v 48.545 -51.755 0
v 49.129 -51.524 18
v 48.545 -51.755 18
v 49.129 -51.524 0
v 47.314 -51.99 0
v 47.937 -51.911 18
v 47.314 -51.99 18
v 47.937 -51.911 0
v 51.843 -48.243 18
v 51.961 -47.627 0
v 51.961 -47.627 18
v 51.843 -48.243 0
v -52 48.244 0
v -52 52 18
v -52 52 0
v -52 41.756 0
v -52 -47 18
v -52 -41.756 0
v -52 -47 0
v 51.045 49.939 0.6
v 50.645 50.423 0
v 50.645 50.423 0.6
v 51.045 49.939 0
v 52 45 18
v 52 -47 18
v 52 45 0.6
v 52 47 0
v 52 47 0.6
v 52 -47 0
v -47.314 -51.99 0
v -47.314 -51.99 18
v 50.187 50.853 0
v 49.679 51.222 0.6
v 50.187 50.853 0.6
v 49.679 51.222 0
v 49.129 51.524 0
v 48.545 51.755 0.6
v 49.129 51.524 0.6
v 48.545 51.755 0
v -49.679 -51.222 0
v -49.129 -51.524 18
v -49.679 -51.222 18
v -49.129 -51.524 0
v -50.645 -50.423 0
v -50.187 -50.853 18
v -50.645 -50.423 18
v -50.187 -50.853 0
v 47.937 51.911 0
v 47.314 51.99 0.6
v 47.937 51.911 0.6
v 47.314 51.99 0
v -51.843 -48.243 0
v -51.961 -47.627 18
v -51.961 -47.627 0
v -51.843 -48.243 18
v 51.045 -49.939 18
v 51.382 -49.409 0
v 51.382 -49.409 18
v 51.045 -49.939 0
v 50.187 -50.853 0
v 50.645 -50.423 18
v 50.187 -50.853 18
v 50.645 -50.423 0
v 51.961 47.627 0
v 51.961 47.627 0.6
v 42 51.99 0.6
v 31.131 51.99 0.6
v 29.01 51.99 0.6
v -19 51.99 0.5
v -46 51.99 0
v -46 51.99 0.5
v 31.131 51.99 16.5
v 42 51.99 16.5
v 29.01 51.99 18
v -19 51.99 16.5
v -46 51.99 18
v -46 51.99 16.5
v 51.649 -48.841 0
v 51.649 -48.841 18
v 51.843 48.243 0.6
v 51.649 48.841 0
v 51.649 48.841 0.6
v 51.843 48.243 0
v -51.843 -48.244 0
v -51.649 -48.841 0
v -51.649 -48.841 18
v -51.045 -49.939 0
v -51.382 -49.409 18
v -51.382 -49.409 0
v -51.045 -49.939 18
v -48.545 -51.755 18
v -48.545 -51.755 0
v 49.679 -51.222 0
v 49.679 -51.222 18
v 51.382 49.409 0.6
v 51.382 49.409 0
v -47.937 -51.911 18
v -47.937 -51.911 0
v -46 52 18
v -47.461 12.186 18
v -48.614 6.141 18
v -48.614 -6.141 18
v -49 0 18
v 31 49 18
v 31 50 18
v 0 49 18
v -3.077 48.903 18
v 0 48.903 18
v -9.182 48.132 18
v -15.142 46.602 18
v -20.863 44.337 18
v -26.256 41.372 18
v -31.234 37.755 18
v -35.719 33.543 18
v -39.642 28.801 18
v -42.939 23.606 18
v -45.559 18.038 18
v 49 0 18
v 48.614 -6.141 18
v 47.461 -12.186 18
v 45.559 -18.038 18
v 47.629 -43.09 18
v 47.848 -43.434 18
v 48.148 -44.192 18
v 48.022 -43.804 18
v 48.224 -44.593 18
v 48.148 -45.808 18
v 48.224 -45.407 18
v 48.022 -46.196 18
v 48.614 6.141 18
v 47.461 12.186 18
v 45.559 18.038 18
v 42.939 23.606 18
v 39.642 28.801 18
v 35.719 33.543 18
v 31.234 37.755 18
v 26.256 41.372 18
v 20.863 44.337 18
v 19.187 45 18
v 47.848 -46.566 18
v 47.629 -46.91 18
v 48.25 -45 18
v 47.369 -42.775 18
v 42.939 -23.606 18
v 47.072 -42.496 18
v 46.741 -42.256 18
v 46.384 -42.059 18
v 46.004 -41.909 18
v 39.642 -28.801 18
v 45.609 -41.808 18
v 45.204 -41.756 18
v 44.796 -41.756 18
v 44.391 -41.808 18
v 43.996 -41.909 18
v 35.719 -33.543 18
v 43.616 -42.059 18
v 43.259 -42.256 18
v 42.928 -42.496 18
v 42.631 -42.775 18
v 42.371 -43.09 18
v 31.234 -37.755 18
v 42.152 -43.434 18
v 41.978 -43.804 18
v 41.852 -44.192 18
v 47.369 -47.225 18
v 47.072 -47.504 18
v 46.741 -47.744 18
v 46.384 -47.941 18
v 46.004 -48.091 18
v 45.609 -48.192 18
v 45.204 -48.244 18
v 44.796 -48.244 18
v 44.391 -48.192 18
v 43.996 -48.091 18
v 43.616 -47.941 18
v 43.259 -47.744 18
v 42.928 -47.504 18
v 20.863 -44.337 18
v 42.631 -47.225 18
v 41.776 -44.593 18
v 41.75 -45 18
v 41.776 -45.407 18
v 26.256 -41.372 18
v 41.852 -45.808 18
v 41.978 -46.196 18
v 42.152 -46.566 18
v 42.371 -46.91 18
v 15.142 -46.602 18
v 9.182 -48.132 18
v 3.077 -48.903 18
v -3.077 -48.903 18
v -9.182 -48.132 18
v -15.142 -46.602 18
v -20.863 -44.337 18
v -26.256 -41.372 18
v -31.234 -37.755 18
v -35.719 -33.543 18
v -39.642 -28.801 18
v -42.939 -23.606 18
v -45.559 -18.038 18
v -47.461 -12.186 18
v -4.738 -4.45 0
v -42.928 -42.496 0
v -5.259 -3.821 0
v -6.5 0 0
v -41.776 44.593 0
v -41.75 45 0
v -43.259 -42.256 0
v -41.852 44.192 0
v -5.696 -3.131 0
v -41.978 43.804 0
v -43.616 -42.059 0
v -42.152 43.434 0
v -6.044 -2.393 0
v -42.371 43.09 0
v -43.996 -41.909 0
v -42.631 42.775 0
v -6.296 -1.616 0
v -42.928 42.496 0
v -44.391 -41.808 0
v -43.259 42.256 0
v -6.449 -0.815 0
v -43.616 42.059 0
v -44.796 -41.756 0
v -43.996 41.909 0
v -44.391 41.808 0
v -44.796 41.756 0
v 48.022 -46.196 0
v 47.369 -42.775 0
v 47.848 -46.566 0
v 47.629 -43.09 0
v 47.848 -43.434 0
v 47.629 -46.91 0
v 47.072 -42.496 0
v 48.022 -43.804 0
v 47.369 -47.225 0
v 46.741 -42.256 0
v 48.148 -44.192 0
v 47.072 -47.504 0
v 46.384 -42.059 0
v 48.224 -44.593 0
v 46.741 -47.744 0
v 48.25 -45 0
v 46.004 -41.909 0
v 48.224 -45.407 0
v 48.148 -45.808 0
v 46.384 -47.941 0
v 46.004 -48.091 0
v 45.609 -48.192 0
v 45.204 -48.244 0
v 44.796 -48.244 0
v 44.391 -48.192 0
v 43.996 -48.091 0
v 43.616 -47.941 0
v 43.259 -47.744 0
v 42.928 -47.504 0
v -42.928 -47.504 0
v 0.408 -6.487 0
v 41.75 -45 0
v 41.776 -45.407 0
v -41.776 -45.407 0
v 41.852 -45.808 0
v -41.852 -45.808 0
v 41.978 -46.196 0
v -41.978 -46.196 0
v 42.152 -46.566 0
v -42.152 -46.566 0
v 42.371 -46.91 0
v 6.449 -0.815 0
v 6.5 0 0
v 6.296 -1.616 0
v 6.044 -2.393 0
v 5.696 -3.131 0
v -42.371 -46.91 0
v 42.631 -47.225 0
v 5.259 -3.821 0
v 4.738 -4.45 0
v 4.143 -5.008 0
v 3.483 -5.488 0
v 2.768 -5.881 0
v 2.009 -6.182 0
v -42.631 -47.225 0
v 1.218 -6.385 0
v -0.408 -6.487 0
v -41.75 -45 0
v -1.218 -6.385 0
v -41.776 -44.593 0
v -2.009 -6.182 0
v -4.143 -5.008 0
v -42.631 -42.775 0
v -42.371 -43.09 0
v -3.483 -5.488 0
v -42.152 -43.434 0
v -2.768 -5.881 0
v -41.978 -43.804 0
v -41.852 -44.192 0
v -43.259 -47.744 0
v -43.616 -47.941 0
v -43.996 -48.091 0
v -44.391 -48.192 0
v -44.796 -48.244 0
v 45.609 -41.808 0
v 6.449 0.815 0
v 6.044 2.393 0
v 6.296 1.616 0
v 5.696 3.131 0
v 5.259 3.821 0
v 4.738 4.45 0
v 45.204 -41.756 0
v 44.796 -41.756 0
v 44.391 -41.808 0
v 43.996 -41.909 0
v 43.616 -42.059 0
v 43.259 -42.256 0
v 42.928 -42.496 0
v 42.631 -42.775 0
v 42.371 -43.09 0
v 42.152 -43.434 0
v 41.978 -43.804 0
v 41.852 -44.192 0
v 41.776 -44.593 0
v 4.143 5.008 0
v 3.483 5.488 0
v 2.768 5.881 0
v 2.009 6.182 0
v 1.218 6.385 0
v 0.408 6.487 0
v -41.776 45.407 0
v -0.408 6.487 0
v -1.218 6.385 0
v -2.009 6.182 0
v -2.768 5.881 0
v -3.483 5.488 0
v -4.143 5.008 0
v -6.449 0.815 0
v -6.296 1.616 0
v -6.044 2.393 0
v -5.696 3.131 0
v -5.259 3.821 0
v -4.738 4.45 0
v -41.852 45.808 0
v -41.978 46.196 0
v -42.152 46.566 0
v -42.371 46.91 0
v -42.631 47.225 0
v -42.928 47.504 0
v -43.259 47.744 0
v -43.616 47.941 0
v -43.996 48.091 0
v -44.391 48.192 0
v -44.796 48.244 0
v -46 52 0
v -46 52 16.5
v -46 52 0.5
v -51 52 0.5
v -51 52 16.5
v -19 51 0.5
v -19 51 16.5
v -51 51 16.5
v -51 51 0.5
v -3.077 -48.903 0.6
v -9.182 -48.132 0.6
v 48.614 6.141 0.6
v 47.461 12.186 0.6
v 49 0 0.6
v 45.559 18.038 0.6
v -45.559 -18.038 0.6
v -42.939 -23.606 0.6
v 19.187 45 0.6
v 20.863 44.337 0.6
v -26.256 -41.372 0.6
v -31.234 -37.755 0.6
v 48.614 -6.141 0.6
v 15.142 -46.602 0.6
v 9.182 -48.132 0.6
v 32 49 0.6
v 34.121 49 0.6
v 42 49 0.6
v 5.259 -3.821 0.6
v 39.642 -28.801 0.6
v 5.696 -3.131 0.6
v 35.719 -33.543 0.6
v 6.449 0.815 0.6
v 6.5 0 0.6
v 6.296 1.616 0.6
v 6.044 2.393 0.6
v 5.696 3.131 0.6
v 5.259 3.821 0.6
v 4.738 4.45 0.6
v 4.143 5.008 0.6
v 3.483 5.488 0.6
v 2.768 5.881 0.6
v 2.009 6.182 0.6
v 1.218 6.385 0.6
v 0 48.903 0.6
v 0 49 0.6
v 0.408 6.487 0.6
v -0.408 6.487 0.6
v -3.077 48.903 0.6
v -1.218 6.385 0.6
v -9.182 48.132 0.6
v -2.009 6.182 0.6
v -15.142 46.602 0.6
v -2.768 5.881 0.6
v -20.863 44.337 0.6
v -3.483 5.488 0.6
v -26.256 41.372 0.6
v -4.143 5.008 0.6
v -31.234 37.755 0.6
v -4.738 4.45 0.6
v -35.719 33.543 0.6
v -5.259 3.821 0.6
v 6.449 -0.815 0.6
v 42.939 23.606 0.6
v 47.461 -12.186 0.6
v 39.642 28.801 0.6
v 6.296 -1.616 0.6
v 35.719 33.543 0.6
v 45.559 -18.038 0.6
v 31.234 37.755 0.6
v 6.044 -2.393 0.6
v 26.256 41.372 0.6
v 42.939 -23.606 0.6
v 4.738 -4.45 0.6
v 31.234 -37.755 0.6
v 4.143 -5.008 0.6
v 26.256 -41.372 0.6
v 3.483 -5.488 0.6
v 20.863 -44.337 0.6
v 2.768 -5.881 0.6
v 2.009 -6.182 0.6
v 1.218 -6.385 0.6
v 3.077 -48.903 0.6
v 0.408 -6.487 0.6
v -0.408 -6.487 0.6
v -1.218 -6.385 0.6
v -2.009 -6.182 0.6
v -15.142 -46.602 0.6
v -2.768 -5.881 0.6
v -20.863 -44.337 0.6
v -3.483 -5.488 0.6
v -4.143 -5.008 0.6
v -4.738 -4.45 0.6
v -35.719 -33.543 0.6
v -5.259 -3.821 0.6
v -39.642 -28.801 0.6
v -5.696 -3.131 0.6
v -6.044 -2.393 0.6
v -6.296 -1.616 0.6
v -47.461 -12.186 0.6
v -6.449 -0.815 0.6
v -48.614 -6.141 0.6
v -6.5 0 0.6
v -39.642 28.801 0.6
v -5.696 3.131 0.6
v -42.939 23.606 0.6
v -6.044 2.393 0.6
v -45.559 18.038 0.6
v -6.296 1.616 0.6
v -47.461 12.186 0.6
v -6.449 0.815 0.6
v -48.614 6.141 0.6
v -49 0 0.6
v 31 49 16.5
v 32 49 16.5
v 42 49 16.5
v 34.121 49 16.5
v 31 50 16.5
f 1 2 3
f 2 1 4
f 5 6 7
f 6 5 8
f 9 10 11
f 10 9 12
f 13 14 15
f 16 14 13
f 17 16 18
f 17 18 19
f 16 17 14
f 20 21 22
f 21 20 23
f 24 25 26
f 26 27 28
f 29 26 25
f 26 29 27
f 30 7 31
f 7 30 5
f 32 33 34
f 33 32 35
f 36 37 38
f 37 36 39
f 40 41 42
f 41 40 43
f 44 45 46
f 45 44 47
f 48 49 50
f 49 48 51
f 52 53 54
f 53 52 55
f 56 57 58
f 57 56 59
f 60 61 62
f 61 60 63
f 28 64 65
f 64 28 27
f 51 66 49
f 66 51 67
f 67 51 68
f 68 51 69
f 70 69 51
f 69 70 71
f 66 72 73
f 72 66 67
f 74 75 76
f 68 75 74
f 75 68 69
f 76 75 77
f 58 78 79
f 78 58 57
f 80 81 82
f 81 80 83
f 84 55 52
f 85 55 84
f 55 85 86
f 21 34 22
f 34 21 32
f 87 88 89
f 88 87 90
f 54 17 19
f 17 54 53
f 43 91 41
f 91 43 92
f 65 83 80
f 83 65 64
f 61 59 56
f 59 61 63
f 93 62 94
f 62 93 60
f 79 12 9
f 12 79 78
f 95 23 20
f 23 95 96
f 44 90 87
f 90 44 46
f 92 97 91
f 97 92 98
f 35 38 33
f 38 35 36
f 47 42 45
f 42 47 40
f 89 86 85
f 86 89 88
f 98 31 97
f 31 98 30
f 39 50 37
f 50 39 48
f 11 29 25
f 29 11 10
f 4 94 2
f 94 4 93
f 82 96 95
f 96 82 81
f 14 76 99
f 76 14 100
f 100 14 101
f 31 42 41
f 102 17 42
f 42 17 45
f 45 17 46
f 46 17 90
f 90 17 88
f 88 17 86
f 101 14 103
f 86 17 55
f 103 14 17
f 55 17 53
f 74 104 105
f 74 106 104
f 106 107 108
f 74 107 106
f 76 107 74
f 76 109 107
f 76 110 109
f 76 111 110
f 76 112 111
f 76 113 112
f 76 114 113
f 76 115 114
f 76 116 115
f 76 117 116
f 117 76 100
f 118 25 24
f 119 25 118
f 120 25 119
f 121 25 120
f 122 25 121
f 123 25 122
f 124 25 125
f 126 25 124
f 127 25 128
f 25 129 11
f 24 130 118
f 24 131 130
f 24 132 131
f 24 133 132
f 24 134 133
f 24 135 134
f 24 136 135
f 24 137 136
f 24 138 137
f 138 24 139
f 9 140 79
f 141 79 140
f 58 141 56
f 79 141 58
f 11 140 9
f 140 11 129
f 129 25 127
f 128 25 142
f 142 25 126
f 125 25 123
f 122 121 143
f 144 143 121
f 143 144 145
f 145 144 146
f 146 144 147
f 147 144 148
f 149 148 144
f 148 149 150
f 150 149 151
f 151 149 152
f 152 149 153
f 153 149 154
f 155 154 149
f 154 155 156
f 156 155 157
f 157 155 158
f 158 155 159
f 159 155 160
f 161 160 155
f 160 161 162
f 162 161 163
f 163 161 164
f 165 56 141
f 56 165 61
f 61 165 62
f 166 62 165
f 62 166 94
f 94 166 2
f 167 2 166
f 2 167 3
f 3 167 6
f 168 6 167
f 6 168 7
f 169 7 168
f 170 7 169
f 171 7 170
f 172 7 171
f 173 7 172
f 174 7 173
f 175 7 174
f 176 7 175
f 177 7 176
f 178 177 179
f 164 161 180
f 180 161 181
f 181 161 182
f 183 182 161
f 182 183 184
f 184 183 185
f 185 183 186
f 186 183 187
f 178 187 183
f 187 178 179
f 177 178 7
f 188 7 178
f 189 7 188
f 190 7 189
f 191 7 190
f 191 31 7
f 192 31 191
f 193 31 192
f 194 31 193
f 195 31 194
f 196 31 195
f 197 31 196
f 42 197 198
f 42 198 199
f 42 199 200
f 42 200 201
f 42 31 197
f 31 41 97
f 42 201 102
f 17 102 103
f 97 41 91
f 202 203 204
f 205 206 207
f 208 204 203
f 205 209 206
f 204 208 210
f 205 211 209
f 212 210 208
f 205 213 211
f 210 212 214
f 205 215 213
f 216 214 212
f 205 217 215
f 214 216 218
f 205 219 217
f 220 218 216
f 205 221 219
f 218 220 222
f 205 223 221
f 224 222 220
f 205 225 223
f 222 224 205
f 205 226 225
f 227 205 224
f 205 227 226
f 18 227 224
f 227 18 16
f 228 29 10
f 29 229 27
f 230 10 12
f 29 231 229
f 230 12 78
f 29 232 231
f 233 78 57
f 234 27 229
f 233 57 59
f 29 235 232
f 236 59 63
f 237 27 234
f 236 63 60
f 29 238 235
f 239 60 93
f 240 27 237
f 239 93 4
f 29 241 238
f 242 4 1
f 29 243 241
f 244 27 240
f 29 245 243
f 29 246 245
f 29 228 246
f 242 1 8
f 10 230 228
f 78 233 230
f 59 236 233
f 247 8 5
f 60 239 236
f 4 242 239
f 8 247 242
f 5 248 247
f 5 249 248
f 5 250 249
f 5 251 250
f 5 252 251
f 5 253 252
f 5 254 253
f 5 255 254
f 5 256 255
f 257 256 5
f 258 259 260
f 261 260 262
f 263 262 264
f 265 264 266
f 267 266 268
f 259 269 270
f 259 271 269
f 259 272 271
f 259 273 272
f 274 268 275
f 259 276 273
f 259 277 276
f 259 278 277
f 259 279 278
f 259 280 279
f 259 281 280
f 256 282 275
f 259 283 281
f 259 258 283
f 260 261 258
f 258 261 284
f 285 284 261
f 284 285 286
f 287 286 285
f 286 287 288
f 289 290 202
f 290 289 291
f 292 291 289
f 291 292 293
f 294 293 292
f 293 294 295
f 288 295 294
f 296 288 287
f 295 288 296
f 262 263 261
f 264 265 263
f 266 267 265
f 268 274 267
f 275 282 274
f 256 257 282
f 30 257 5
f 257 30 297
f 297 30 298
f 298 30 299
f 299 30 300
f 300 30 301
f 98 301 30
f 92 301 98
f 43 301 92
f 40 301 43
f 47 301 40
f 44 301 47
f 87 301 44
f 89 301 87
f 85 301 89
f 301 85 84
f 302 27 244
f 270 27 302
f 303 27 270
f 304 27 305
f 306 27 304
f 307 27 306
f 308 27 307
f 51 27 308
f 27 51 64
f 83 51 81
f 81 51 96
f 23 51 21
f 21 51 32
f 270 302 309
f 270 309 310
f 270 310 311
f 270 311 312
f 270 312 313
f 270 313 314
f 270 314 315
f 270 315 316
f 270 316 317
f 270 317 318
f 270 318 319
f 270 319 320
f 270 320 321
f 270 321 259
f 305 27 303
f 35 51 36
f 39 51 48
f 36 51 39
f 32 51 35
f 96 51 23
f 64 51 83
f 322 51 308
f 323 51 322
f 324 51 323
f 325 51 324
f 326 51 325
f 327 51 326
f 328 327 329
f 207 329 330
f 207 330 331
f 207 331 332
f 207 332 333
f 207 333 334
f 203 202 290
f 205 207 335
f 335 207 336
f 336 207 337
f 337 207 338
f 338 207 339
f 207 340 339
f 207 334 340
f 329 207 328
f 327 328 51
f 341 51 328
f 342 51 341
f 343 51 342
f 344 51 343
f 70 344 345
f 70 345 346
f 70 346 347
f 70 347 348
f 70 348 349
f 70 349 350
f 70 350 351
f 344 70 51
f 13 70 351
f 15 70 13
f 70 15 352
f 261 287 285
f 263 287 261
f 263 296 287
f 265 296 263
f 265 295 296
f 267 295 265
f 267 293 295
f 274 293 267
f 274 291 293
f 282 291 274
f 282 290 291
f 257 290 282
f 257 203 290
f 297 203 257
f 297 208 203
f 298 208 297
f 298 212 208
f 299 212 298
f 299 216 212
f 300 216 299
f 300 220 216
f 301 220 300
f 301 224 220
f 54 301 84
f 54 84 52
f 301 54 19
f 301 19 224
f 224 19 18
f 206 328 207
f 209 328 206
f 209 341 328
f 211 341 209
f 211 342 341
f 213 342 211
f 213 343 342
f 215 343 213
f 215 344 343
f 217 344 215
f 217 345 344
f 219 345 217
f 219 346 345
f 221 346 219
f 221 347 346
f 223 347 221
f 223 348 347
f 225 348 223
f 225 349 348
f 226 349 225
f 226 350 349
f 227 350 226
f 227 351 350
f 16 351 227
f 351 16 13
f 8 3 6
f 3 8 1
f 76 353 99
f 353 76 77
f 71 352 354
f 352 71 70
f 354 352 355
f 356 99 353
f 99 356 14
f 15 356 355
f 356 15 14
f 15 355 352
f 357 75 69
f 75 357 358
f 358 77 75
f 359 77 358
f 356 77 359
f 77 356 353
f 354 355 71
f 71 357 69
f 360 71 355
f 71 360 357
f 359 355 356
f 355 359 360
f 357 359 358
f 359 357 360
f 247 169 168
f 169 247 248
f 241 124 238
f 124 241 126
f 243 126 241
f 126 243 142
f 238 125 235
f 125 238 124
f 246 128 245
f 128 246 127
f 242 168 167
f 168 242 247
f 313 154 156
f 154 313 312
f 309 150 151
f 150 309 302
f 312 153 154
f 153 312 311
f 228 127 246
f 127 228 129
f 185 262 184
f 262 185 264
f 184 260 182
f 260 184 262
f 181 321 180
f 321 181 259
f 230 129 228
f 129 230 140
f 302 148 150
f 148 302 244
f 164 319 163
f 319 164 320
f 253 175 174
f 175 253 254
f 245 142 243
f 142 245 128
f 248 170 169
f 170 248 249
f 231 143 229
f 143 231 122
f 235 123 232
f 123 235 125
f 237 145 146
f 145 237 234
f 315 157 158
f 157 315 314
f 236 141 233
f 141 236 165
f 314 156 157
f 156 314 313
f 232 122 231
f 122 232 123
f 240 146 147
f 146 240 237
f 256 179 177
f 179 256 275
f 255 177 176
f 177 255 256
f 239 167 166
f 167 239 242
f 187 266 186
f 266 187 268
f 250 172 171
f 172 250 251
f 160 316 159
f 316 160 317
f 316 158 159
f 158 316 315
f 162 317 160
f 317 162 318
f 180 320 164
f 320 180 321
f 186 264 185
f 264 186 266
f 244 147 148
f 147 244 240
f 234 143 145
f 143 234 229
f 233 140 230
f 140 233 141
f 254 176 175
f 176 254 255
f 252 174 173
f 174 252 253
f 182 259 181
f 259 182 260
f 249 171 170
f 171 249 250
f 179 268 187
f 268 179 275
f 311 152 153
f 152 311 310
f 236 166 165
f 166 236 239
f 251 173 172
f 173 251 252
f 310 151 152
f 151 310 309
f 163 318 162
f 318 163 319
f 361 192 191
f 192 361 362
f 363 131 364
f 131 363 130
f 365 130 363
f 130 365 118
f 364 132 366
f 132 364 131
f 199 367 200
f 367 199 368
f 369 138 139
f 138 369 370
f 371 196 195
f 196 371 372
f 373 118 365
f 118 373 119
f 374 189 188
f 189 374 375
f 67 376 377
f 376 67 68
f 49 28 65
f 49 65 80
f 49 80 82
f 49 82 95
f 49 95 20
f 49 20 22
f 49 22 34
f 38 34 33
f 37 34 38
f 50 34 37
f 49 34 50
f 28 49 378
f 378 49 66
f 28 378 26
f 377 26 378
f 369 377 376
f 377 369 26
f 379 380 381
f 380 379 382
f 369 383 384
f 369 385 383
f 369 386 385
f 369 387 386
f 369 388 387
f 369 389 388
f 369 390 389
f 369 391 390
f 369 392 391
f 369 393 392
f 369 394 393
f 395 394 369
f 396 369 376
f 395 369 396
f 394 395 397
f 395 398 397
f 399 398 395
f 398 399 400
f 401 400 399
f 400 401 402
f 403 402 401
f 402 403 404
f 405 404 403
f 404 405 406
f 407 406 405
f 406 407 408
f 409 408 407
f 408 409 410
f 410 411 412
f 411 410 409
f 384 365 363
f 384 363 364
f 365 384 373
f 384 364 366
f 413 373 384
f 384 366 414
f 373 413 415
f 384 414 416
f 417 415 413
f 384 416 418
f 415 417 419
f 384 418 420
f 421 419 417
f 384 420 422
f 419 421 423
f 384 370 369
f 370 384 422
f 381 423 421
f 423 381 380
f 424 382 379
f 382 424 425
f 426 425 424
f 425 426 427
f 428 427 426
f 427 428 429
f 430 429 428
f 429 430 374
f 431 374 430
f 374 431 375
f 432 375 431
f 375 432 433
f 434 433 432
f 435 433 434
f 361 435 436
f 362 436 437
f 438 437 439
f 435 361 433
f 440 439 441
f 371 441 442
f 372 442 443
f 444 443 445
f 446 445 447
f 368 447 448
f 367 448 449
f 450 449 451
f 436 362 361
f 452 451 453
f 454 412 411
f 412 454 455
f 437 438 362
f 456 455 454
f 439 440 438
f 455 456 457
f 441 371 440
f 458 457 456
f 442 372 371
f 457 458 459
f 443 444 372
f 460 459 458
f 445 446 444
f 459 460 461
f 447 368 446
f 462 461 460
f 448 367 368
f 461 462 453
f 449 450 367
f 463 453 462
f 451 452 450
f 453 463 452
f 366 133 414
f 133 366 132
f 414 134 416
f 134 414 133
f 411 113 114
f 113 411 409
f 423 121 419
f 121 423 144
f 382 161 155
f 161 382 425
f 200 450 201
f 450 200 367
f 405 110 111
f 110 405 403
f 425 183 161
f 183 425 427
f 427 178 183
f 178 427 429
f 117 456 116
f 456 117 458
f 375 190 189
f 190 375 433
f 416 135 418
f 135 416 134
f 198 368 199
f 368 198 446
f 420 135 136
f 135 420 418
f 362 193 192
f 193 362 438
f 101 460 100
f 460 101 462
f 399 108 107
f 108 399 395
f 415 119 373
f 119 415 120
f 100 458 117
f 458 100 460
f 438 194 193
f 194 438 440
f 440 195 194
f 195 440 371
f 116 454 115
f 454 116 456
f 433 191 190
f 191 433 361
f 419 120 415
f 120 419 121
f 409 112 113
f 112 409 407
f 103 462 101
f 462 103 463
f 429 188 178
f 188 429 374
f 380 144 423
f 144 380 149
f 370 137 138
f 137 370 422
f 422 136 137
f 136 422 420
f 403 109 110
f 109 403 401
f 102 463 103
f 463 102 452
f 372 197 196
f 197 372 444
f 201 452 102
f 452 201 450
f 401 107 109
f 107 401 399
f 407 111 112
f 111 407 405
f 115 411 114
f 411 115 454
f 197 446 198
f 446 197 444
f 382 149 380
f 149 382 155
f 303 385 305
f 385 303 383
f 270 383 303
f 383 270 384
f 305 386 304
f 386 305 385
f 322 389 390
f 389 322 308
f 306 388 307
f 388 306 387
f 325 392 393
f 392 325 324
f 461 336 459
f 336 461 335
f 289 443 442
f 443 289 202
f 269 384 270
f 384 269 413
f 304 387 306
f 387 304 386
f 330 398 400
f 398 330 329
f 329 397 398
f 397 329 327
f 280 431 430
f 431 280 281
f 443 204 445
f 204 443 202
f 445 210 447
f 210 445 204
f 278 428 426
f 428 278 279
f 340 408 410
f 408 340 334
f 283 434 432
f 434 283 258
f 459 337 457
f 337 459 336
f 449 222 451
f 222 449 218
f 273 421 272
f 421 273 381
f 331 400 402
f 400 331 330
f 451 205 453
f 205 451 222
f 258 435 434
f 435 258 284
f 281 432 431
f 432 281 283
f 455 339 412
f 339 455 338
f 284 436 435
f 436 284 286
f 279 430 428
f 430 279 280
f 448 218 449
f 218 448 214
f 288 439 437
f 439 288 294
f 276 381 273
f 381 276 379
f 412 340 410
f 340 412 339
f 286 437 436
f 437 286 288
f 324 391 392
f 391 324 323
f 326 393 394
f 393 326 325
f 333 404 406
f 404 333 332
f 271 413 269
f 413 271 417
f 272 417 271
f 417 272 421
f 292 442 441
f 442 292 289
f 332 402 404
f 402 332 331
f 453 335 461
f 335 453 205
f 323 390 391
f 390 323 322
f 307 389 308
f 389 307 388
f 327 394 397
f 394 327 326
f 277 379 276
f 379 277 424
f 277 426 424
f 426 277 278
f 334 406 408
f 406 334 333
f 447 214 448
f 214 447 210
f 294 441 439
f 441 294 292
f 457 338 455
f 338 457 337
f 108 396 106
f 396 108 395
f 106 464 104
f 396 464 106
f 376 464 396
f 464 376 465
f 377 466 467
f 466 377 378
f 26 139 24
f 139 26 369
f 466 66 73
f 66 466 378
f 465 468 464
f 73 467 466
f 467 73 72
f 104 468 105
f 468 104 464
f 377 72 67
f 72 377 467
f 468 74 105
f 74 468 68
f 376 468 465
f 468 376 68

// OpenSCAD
$fn = 50;


difference() {
	union() {
		hull() {
			translate(v = [-47.0000000000, 47.0000000000, 0]) {
				cylinder(h = 18, r = 5);
			}
			translate(v = [47.0000000000, 47.0000000000, 0]) {
				cylinder(h = 18, r = 5);
			}
			translate(v = [-47.0000000000, -47.0000000000, 0]) {
				cylinder(h = 18, r = 5);
			}
			translate(v = [47.0000000000, -47.0000000000, 0]) {
				cylinder(h = 18, r = 5);
			}
		}
		translate(v = [-52.0000000000, 46.0000000000, 0]) {
			cube(size = [6, 6, 18]);
		}
	}
	union() {
		translate(v = [-52.5000000000, -45.0000000000, -250.0000000000]) {
			rotate(a = [0, 0, 0]) {
				difference() {
					union() {
						hull() {
							translate(v = [7.5000000000, 0, 0]) {
								cylinder(h = 250, r = 3.2500000000, r1 = 3.2500000000, r2 = 3.2500000000);
							}
							translate(v = [-7.5000000000, 0, 0]) {
								cylinder(h = 250, r = 3.2500000000, r1 = 3.2500000000, r2 = 3.2500000000);
							}
						}
					}
					union();
				}
			}
		}
		translate(v = [-52.5000000000, 45.0000000000, -250.0000000000]) {
			rotate(a = [0, 0, 0]) {
				difference() {
					union() {
						hull() {
							translate(v = [7.5000000000, 0, 0]) {
								cylinder(h = 250, r = 3.2500000000, r1 = 3.2500000000, r2 = 3.2500000000);
							}
							translate(v = [-7.5000000000, 0, 0]) {
								cylinder(h = 250, r = 3.2500000000, r1 = 3.2500000000, r2 = 3.2500000000);
							}
						}
					}
					union();
				}
			}
		}
		translate(v = [-51.0000000000, 51.0000000000, 0.5000000000]) {
			cube(size = [32, 1, 16]);
		}
		translate(v = [45.0000000000, -45.0000000000, -50.0000000000]) {
			cylinder(h = 100, r = 3.2500000000);
		}
		translate(v = [0, 0, 0.6000000000]) {
			cylinder(h = 20.4000000000, r = 49.0000000000);
		}
		translate(v = [0, 0, -9.0000000000]) {
			cylinder(h = 18, r = 6.5000000000);
		}
		translate(v = [0.0000000000, 45.0000000000, 0.6000000000]) {
			cube(size = [52.0000000000, 4, 20.4000000000]);
		}
		translate(v = [42.0000000000, 45.0000000000, 0.6000000000]) {
			cube(size = [10, 7, 20.4000000000]);
		}
		translate(v = [31.0000000000, 45.0000000000, 16.5000000000]) {
			cube(size = [21, 7, 1.5000000000]);
		}
		translate(v = [28.2500000000, 52.7500000000, 0.6000000000]) {
			rotate(a = [0, 0, -45]) {
				cube(size = [7.5000000000, 1.5000000000, 20.4000000000]);
			}
		}
		translate(v = [11.0610000000, 43.0000000000, 0.6000000000]) {
			cube(size = [7.5000000000, 2, 17.4000000000]);
		}
	}
}
